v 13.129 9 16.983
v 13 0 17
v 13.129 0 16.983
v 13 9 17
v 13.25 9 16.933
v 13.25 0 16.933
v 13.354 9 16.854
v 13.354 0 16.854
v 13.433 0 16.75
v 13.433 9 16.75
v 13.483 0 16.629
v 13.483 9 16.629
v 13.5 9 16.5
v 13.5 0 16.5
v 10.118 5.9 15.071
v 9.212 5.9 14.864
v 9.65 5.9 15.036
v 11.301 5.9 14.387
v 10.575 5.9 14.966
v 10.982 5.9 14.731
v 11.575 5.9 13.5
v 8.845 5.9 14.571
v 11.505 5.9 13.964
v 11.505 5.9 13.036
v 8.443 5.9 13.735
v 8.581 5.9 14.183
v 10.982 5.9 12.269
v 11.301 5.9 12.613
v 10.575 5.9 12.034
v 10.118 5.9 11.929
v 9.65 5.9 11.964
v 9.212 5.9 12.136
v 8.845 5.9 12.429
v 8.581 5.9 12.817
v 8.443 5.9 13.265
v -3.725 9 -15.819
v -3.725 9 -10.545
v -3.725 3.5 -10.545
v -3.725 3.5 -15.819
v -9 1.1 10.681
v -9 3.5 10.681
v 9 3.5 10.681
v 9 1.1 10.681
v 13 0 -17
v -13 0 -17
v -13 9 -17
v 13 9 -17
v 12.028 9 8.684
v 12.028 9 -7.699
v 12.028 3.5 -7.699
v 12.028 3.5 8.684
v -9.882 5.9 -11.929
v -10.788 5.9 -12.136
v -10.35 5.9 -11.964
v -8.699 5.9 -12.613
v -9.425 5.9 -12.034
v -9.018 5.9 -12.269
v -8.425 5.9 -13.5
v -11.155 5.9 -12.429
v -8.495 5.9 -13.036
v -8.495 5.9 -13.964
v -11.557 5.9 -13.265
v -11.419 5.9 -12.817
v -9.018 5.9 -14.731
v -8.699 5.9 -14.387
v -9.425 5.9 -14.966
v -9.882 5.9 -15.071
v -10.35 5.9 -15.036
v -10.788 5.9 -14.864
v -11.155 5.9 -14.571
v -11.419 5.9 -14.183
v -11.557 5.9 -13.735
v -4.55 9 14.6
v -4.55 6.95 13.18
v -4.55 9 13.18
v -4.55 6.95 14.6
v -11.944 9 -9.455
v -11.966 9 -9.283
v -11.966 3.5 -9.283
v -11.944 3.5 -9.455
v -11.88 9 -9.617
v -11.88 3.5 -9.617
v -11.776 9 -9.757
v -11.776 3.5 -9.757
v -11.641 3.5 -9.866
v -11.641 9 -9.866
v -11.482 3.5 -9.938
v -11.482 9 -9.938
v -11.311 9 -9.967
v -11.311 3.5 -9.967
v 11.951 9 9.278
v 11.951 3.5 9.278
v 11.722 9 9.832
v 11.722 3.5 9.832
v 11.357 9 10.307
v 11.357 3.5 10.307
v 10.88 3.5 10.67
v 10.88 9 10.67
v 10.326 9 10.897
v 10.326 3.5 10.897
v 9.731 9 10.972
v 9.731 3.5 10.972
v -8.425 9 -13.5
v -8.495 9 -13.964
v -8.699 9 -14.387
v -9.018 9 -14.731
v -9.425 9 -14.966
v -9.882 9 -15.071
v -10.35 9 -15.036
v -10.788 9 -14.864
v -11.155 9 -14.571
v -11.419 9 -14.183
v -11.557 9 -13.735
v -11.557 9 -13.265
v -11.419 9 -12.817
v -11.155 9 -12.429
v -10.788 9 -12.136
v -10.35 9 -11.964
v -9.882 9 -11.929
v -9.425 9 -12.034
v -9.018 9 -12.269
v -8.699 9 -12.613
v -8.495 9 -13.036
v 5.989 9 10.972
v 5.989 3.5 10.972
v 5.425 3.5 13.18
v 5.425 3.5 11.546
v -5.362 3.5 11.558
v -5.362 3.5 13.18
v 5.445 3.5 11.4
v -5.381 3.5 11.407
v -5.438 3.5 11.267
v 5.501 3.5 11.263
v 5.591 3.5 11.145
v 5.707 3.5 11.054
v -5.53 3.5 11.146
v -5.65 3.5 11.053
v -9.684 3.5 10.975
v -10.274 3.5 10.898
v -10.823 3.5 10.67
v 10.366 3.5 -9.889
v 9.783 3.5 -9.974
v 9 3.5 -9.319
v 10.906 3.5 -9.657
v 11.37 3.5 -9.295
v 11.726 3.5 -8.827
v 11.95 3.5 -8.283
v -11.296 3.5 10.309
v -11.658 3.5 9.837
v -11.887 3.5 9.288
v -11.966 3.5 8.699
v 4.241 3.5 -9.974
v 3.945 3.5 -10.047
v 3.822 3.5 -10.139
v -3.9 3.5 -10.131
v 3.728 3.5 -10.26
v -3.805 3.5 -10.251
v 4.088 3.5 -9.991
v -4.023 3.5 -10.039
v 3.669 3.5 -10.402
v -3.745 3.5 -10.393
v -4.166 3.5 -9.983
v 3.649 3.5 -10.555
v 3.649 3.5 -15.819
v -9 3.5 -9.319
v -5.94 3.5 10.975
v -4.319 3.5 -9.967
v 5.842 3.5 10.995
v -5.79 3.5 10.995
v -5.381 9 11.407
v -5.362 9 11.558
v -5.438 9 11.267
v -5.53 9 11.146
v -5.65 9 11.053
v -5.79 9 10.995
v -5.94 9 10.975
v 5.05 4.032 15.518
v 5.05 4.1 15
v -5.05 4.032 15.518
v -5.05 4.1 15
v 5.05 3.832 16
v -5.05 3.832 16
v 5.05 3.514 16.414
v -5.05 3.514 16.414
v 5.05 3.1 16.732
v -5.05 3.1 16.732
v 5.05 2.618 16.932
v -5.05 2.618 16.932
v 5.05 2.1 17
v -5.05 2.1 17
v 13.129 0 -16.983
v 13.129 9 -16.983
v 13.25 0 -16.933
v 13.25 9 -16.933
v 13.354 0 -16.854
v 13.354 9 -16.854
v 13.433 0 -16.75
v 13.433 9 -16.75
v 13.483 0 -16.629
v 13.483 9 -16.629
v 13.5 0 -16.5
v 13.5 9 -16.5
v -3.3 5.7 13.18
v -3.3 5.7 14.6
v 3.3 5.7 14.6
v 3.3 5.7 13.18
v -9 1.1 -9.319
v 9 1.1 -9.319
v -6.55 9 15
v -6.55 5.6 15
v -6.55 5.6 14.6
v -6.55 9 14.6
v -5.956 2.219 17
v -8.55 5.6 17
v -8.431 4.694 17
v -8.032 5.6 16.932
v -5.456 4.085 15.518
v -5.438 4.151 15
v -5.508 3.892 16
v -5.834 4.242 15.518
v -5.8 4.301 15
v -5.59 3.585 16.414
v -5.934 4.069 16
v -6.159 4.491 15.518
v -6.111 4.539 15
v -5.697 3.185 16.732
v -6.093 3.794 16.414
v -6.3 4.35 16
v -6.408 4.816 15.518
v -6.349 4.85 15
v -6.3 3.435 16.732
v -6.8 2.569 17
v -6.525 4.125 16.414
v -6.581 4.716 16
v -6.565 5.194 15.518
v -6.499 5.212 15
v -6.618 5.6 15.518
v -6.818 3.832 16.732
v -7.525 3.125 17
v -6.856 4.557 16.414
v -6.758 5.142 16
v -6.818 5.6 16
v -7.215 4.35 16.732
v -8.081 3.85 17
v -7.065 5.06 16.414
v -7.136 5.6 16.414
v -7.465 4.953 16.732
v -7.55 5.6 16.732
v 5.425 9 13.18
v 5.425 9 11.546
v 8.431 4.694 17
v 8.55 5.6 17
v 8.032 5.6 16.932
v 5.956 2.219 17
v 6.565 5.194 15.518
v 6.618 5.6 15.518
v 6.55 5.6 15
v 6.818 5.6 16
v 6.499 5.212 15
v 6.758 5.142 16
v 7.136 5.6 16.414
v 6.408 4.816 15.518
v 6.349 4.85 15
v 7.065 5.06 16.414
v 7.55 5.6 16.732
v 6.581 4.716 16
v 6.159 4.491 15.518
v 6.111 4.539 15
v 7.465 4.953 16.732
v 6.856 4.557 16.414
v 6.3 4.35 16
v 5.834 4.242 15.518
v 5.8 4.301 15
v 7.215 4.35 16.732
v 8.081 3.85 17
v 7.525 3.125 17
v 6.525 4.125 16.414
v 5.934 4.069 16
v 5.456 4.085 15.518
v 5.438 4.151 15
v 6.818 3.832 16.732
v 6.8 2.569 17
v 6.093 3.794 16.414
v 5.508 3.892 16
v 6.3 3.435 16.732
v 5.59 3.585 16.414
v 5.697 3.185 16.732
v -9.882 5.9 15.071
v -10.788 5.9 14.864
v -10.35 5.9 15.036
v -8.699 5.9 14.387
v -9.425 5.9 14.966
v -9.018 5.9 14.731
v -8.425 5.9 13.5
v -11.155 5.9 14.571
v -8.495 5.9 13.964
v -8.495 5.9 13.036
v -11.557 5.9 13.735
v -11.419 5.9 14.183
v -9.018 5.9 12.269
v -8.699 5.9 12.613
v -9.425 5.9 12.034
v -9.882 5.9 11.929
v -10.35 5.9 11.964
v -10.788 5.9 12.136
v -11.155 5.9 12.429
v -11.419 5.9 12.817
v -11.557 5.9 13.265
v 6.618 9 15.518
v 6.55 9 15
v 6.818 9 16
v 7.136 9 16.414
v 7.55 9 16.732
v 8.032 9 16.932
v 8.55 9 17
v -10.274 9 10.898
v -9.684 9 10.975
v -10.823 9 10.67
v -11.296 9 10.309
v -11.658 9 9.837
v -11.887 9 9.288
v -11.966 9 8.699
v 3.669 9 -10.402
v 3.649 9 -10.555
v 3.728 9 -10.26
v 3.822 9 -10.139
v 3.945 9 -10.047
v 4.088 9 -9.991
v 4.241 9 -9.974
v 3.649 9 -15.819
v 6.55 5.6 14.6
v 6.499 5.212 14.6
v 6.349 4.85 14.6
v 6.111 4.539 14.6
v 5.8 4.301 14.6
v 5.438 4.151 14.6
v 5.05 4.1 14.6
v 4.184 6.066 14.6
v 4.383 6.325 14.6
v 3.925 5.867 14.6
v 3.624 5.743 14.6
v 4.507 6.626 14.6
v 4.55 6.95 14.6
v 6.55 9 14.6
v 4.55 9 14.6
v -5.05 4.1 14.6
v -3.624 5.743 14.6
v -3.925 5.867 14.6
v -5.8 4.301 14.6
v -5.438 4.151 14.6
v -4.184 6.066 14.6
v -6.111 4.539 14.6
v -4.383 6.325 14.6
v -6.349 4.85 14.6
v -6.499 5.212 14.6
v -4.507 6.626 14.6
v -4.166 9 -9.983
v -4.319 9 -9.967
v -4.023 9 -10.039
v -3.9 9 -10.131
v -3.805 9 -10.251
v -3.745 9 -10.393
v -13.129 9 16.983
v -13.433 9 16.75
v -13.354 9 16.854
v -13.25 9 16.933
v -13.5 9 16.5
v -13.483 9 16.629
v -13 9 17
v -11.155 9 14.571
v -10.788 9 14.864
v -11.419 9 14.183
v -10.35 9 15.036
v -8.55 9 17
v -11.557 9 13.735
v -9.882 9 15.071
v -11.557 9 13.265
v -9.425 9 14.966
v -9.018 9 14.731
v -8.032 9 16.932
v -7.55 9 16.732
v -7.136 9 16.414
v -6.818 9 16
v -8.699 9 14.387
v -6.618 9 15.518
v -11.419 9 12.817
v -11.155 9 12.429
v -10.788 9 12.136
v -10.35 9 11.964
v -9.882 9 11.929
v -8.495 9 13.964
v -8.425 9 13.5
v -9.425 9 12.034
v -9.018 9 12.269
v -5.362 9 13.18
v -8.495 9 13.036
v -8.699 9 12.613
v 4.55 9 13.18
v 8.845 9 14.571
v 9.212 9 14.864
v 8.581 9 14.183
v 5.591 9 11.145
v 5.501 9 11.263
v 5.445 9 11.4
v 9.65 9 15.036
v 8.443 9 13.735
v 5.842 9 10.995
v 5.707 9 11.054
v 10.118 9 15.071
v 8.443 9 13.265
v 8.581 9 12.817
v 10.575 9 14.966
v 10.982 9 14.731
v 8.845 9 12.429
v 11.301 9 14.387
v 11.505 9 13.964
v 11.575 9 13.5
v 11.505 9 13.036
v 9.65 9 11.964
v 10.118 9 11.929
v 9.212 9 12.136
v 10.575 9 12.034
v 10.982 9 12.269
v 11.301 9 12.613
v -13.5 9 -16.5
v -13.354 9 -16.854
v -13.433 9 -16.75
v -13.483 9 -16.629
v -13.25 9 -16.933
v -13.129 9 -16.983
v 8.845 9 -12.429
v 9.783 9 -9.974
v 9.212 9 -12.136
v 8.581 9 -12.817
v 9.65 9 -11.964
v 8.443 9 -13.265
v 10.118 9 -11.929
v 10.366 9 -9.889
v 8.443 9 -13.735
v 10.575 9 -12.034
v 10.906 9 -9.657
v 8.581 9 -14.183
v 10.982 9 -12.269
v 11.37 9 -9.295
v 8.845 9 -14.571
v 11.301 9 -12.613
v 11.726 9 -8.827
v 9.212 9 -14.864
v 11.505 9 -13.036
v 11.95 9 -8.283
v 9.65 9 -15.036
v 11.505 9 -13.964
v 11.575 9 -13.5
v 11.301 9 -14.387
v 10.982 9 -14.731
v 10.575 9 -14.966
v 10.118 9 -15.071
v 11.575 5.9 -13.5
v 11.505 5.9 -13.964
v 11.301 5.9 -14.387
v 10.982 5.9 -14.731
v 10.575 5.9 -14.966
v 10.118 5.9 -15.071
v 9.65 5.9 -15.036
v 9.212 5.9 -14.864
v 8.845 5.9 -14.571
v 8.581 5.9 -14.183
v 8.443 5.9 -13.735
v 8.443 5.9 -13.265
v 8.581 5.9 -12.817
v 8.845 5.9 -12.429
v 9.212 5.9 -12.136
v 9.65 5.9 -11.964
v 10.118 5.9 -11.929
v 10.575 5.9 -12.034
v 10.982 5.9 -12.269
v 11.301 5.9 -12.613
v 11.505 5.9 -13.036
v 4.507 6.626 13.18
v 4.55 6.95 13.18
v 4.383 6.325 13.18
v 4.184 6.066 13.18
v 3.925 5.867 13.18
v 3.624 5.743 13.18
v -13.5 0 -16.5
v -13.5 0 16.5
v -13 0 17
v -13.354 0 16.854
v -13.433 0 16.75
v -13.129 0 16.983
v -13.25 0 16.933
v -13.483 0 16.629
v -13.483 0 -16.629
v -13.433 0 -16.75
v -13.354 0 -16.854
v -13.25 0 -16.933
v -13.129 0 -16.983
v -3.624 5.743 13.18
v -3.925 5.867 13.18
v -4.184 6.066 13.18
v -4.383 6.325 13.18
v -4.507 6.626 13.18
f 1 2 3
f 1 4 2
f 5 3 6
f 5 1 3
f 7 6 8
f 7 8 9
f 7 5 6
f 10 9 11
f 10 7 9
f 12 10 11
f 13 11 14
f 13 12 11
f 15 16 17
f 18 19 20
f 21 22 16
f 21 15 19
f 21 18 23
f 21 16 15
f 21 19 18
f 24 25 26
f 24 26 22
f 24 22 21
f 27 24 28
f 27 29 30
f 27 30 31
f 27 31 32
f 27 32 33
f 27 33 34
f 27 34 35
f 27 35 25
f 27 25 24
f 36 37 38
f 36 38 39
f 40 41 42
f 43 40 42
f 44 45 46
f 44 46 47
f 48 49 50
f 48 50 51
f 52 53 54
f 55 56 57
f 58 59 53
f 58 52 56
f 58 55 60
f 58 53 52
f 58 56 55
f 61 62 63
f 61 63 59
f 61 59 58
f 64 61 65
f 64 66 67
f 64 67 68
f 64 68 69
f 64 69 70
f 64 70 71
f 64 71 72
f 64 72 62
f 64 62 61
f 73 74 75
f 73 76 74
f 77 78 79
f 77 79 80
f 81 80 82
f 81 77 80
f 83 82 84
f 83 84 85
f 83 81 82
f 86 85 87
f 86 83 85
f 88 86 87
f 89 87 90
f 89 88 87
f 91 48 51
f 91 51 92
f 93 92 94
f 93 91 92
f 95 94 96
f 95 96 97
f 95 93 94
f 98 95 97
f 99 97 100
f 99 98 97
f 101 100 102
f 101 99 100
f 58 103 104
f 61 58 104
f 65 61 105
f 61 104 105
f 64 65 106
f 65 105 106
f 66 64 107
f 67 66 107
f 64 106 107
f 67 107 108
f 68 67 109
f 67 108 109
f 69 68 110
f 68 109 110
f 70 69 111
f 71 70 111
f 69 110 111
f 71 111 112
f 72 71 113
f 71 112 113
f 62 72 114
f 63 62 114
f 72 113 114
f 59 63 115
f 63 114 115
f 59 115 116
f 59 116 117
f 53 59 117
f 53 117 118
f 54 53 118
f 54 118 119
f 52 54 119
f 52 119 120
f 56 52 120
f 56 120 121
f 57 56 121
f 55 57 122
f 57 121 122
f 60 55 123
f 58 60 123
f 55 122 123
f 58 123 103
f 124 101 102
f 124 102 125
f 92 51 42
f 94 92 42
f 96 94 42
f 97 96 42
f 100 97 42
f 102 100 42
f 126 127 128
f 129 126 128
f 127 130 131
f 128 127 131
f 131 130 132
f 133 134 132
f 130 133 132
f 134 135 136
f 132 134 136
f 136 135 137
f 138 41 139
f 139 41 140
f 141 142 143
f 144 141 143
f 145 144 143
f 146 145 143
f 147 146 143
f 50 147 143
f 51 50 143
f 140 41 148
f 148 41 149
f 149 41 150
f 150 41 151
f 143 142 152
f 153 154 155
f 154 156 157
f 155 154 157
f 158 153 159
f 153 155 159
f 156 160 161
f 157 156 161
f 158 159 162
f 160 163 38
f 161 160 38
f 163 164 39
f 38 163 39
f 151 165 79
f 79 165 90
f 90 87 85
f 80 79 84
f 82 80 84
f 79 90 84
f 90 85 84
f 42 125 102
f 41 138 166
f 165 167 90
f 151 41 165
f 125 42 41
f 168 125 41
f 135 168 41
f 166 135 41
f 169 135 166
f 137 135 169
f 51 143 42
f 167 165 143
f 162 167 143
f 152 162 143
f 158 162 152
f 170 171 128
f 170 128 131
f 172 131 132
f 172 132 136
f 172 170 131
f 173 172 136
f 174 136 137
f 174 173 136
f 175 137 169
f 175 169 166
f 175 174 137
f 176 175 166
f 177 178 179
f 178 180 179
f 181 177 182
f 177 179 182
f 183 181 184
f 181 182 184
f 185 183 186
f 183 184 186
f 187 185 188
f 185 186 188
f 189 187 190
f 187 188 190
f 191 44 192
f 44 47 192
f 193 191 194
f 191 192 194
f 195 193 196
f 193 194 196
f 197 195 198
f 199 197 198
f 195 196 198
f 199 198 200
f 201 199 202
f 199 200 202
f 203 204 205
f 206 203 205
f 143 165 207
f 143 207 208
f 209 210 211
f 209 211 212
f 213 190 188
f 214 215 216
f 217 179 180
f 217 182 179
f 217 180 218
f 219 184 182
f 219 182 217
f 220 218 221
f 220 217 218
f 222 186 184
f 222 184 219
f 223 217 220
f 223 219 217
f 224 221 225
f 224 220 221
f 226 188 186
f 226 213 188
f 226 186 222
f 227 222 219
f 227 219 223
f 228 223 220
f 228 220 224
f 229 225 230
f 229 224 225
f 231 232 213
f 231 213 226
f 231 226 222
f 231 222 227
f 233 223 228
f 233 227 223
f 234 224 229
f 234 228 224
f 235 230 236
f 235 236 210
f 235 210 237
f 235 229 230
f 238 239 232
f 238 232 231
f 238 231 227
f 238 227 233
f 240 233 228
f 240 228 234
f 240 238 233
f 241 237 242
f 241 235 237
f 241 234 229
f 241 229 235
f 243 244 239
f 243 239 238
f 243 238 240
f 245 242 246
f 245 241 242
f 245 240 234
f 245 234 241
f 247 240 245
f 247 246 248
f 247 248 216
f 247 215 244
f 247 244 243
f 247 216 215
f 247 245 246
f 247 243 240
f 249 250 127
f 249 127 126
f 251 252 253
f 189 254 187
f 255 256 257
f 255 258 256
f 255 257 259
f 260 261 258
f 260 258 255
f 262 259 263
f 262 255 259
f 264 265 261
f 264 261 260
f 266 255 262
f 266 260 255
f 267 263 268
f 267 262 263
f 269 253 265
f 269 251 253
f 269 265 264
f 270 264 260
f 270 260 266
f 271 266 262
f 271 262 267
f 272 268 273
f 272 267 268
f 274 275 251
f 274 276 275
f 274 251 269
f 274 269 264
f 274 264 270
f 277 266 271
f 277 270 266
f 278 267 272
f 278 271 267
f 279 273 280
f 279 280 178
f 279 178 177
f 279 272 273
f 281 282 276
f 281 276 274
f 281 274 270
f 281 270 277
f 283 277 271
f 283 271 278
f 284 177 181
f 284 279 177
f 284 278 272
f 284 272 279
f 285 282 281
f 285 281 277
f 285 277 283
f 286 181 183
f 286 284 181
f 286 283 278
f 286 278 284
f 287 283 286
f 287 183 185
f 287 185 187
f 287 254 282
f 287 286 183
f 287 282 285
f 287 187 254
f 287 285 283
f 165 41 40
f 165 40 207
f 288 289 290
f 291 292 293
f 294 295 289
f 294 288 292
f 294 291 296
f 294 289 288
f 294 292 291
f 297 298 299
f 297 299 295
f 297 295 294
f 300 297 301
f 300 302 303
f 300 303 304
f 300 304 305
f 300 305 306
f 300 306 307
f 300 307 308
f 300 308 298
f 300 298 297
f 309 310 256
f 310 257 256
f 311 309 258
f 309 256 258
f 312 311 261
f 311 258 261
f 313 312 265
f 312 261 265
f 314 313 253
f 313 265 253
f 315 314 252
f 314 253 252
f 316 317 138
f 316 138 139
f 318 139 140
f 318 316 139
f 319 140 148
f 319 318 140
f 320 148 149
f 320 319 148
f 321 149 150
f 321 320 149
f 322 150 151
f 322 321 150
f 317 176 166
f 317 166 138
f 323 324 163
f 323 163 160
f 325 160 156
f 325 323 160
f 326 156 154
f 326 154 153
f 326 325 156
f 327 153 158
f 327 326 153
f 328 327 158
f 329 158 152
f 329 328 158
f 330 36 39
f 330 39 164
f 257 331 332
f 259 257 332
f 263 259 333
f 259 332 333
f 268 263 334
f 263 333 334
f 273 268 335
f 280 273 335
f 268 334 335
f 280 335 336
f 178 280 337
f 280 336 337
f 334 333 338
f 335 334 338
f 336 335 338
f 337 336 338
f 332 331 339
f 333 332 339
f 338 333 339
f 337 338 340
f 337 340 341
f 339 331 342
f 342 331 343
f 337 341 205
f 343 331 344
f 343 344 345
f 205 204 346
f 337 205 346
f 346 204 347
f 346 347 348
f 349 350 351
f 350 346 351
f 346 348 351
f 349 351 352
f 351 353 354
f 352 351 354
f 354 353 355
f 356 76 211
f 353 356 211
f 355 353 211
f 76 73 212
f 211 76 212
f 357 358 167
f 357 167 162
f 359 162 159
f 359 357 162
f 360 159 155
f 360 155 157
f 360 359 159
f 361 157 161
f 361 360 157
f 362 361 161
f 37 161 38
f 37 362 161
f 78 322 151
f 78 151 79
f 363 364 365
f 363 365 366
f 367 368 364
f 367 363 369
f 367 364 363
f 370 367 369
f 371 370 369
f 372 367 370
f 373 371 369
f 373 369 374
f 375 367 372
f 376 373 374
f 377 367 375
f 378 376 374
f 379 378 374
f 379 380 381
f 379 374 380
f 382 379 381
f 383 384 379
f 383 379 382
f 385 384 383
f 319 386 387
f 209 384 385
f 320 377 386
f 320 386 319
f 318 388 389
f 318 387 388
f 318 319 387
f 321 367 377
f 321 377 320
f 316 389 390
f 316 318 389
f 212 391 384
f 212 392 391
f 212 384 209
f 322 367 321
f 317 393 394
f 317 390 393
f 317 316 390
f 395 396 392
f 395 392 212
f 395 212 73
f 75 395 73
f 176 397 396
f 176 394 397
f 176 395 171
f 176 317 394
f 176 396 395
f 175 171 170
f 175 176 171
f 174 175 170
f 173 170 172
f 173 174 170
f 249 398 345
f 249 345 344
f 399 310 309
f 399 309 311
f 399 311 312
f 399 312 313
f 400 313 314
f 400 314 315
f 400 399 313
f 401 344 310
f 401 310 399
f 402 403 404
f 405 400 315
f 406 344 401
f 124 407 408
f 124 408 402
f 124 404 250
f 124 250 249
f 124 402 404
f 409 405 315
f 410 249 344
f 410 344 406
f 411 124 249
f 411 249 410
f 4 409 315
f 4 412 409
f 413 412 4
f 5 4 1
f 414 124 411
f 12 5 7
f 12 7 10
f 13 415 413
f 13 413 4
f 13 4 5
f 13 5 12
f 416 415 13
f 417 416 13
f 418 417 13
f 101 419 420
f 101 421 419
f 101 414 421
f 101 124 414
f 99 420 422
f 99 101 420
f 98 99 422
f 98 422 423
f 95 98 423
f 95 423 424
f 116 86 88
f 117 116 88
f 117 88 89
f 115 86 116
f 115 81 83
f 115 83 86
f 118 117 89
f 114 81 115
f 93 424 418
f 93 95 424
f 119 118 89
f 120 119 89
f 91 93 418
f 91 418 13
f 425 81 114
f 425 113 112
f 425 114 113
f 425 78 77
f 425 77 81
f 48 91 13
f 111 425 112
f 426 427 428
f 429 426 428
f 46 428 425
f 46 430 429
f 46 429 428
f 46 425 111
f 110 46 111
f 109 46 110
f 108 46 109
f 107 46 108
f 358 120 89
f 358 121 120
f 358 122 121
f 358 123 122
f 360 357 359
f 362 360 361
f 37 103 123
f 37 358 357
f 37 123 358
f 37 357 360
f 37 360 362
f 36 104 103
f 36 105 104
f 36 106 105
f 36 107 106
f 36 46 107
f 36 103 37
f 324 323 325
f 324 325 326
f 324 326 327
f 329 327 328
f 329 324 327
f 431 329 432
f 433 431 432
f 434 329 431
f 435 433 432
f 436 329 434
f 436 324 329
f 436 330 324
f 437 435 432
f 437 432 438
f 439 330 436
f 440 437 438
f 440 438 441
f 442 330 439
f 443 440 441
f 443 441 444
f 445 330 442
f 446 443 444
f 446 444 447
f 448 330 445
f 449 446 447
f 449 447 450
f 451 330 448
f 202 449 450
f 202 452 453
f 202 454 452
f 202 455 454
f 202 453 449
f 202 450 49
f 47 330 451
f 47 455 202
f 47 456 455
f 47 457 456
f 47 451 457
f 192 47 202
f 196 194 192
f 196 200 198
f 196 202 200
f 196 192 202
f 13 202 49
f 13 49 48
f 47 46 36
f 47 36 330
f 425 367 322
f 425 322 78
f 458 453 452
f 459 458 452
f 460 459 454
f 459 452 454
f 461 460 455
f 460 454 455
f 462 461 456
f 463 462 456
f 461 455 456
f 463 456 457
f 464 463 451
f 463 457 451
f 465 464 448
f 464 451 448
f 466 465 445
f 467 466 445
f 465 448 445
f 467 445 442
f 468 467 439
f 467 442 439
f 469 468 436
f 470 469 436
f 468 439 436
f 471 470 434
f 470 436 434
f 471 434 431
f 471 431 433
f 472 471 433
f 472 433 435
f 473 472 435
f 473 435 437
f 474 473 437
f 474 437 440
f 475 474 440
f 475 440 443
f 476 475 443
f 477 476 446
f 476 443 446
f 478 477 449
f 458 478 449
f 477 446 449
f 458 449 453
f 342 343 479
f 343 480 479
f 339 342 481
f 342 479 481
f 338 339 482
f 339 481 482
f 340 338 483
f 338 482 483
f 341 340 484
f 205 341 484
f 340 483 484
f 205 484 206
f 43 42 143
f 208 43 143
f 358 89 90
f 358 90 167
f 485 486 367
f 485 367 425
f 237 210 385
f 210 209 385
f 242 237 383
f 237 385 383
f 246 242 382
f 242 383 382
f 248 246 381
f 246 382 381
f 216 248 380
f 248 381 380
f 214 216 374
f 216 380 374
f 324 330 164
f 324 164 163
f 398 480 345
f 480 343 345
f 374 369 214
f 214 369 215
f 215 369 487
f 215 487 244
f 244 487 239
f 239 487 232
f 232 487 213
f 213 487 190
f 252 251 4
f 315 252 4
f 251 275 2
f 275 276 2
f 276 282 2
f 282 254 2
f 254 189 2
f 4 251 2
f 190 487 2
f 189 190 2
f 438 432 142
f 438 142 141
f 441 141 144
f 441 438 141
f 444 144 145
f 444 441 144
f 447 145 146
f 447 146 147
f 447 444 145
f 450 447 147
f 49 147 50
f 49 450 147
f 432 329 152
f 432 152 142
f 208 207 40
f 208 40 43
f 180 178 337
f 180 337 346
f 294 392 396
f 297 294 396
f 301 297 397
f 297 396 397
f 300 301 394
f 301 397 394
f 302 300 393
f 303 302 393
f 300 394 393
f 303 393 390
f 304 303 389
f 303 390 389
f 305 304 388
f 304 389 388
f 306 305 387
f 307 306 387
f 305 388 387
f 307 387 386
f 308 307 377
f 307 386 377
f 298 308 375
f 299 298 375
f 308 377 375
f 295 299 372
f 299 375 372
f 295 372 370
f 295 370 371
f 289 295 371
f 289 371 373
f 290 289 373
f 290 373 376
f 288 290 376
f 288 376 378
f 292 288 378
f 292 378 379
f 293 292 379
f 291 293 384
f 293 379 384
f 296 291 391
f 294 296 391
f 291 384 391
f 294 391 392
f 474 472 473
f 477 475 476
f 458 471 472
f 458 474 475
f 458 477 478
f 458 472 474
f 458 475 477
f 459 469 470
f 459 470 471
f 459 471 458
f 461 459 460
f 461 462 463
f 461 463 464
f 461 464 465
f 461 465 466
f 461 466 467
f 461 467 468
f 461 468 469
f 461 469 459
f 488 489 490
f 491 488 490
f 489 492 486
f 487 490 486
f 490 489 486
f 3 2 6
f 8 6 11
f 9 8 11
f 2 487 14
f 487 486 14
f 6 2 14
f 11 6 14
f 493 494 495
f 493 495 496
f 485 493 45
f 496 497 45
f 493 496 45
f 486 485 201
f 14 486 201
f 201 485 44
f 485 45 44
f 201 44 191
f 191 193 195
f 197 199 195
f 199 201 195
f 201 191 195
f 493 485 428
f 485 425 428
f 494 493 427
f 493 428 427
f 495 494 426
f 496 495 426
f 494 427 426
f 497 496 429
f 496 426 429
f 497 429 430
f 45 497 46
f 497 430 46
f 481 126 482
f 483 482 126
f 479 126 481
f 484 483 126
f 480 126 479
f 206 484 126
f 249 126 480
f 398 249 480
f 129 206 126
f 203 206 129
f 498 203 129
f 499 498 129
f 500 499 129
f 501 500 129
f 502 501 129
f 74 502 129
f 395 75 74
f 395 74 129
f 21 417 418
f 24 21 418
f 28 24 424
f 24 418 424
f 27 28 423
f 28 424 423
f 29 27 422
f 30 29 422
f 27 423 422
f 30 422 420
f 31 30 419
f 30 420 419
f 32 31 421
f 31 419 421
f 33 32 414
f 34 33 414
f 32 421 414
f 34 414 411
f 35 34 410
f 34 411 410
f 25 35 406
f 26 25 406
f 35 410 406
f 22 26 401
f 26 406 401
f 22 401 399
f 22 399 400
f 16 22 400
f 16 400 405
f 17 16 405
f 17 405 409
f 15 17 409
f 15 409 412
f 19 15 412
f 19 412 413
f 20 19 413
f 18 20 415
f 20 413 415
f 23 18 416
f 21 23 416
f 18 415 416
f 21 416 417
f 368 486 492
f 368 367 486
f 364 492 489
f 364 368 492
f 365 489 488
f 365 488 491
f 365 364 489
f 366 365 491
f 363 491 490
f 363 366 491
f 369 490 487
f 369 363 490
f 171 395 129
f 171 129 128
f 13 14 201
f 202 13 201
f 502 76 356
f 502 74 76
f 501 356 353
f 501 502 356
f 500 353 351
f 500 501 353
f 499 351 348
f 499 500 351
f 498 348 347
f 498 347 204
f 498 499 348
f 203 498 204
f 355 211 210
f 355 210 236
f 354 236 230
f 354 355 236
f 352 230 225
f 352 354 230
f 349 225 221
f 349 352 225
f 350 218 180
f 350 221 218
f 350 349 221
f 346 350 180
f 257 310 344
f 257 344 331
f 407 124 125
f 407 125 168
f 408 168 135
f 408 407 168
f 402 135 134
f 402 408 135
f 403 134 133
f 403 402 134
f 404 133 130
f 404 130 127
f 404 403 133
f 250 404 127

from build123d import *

# Parameters (mm, degrees)
SKETCH_1_W          = 27
SKETCH_1_H          = 34
EXTRUDE_1_DEPTH     = 9
CUT_EXTRUDE_1_DEPTH = 5.5
SKETCH_5_W          = 18
SKETCH_5_H          = 20
CUT_EXTRUDE_2_DEPTH = 2.4
SKETCH_7_W          = 9.1
SKETCH_7_H          = 3.3
CUT_EXTRUDE_3_DEPTH = 3.820001
CUT_EXTRUDE_4_DEPTH = 2.4
SKETCH_9_R          = 1.575
CUT_EXTRUDE_5_DEPTH = 3.1
FILLET_1_R          = 0.5
FILLET_2_R          = 1.5
FILLET_3_R          = 1.25
FILLET_4_R          = 2


with BuildPart() as part:
    # 草图1 → 凸台-拉伸1 (new body)
    with BuildSketch(Plane(origin=(0, 0, 0), x_dir=(1, 0, 0), z_dir=(0, 1, 0))):
        Rectangle(SKETCH_1_W, SKETCH_1_H)
    extrude(amount=EXTRUDE_1_DEPTH)

    # 草图3 → 切除-拉伸1 (cut)
    with BuildSketch(Plane(origin=(0, 9, 0), x_dir=(1, 0, 0), z_dir=(0, 1, 0))):
        with BuildLine():
            Line((-3.725034324, 15.819299777), (3.648970913, 15.819299777))
            Line((3.648970913, 15.819299777), (3.64896994, 10.554745119))
            ThreePointArc((3.64896994, 10.554745119), (3.822350515, 10.139234755), (4.241249073, 9.974209696))
            Line((4.241249073, 9.974209696), (9.783400257, 9.974209696))
            ThreePointArc((9.783400257, 9.974209696), (11.370154466, 9.295205446), (12.02766691, 7.699425674))
            Line((12.02766691, 7.699425674), (12.02766691, -8.683574325))
            ThreePointArc((12.02766691, -8.683574325), (11.356679802, -10.306708388), (9.731381036, -10.972434915))
            Line((9.731381036, -10.972434915), (5.988537145, -10.972434915))
            ThreePointArc((5.988537145, -10.972434915), (5.590573679, -11.145336005), (5.425084588, -11.546438321))
            Line((5.425084588, -11.546438321), (5.425084588, -13.179999201))
            Line((5.425084588, -13.179999201), (-5.361915412, -13.179999201))
            Line((-5.361915412, -13.179999201), (-5.361915412, -11.557540546))
            ThreePointArc((-5.361915412, -11.557540546), (-5.529636352, -11.146058241), (-5.93984312, -10.975241356))
            Line((-5.93984312, -10.975241356), (-9.683907212, -10.975243852))
            ThreePointArc((-9.683907212, -10.975243852), (-11.295675804, -10.308730473), (-11.96592401, -8.698511128))
            Line((-11.96592401, -8.698511128), (-11.965923922, 9.282882934))
            ThreePointArc((-11.965923922, 9.282882934), (-11.776218419, 9.756882394), (-11.311023769, 9.967257479))
            Line((-11.311023769, 9.967257479), (-4.318854243, 9.967257479))
            ThreePointArc((-4.318854243, 9.967257479), (-3.899962458, 10.130736448), (-3.725034039, 10.544977621))
            Line((-3.725034039, 10.544977621), (-3.725034324, 15.819299777))
        make_face()
    extrude(amount=-CUT_EXTRUDE_1_DEPTH, mode=Mode.SUBTRACT)

    # 草图5 → 切除-拉伸2 (cut)
    with BuildSketch(Plane(origin=(0, 3.5, 0), x_dir=(1, 0, 0), z_dir=(0, 1, 0))):
        with Locations((0, -0.680700223)):
            Rectangle(SKETCH_5_W, SKETCH_5_H)
    extrude(amount=-CUT_EXTRUDE_2_DEPTH, mode=Mode.SUBTRACT)

    # 草图7 → 切除-拉伸3 (cut)
    with BuildSketch(Plane.XY.offset(17)):
        with Locations((0, 7.35)):
            Rectangle(SKETCH_7_W, SKETCH_7_H)
    extrude(amount=-CUT_EXTRUDE_3_DEPTH, mode=Mode.SUBTRACT)

    # 草图8 → 切除-拉伸4 (cut)
    with BuildSketch(Plane.XY.offset(17)):
        Polygon((6.55, 4.1), (-6.55, 4.1), (-6.55, 9), (-4.55, 9), (4.55, 9), (6.55, 9), align=None)
    extrude(amount=-CUT_EXTRUDE_4_DEPTH, mode=Mode.SUBTRACT)

    # 草图9 → 切除-拉伸5 (cut)
    with BuildSketch(Plane(origin=(0, 9, 0), x_dir=(1, 0, 0), z_dir=(0, 1, 0))):
        with Locations((-10, 13.5)):
            Circle(SKETCH_9_R)
        with Locations((10, 13.5)):
            Circle(SKETCH_9_R)
        with Locations((10, -13.5)):
            Circle(SKETCH_9_R)
        with Locations((-10, -13.5)):
            Circle(SKETCH_9_R)
    extrude(amount=-CUT_EXTRUDE_5_DEPTH, mode=Mode.SUBTRACT)

    # 圆角1
    fillet_1_edges = [part.edges().sort_by_distance(p)[0] for p in [
        (13.5, 4.5, 17),
        (-13.5, 4.5, 17),
        (-13.5, 4.5, -17),
        (13.5, 4.5, -17),
    ]]
    fillet(fillet_1_edges, radius=FILLET_1_R)

    # 圆角2
    fillet_2_edges = [part.edges().sort_by_distance(p)[0] for p in [
        (6.55, 4.1, 15.8),
        (-6.55, 4.1, 15.8),
    ]]
    fillet(fillet_2_edges, radius=FILLET_2_R)

    # 圆角3
    fillet_3_edges = [part.edges().sort_by_distance(p)[0] for p in [
        (4.55, 5.7, 13.8899995),
        (-4.55, 5.7, 13.8899995),
    ]]
    fillet(fillet_3_edges, radius=FILLET_3_R)

    # 圆角4
    fillet_4_edges = [part.edges().sort_by_distance(p)[0] for p in [
        (-6.55, 7.3, 17),
        (6.55, 7.3, 17),
        (0, 4.1, 17),
        (6.110660172, 4.539339828, 17),
        (-6.110660172, 4.539339828, 17),
    ]]
    fillet(fillet_4_edges, radius=FILLET_4_R)


solid = part.part
